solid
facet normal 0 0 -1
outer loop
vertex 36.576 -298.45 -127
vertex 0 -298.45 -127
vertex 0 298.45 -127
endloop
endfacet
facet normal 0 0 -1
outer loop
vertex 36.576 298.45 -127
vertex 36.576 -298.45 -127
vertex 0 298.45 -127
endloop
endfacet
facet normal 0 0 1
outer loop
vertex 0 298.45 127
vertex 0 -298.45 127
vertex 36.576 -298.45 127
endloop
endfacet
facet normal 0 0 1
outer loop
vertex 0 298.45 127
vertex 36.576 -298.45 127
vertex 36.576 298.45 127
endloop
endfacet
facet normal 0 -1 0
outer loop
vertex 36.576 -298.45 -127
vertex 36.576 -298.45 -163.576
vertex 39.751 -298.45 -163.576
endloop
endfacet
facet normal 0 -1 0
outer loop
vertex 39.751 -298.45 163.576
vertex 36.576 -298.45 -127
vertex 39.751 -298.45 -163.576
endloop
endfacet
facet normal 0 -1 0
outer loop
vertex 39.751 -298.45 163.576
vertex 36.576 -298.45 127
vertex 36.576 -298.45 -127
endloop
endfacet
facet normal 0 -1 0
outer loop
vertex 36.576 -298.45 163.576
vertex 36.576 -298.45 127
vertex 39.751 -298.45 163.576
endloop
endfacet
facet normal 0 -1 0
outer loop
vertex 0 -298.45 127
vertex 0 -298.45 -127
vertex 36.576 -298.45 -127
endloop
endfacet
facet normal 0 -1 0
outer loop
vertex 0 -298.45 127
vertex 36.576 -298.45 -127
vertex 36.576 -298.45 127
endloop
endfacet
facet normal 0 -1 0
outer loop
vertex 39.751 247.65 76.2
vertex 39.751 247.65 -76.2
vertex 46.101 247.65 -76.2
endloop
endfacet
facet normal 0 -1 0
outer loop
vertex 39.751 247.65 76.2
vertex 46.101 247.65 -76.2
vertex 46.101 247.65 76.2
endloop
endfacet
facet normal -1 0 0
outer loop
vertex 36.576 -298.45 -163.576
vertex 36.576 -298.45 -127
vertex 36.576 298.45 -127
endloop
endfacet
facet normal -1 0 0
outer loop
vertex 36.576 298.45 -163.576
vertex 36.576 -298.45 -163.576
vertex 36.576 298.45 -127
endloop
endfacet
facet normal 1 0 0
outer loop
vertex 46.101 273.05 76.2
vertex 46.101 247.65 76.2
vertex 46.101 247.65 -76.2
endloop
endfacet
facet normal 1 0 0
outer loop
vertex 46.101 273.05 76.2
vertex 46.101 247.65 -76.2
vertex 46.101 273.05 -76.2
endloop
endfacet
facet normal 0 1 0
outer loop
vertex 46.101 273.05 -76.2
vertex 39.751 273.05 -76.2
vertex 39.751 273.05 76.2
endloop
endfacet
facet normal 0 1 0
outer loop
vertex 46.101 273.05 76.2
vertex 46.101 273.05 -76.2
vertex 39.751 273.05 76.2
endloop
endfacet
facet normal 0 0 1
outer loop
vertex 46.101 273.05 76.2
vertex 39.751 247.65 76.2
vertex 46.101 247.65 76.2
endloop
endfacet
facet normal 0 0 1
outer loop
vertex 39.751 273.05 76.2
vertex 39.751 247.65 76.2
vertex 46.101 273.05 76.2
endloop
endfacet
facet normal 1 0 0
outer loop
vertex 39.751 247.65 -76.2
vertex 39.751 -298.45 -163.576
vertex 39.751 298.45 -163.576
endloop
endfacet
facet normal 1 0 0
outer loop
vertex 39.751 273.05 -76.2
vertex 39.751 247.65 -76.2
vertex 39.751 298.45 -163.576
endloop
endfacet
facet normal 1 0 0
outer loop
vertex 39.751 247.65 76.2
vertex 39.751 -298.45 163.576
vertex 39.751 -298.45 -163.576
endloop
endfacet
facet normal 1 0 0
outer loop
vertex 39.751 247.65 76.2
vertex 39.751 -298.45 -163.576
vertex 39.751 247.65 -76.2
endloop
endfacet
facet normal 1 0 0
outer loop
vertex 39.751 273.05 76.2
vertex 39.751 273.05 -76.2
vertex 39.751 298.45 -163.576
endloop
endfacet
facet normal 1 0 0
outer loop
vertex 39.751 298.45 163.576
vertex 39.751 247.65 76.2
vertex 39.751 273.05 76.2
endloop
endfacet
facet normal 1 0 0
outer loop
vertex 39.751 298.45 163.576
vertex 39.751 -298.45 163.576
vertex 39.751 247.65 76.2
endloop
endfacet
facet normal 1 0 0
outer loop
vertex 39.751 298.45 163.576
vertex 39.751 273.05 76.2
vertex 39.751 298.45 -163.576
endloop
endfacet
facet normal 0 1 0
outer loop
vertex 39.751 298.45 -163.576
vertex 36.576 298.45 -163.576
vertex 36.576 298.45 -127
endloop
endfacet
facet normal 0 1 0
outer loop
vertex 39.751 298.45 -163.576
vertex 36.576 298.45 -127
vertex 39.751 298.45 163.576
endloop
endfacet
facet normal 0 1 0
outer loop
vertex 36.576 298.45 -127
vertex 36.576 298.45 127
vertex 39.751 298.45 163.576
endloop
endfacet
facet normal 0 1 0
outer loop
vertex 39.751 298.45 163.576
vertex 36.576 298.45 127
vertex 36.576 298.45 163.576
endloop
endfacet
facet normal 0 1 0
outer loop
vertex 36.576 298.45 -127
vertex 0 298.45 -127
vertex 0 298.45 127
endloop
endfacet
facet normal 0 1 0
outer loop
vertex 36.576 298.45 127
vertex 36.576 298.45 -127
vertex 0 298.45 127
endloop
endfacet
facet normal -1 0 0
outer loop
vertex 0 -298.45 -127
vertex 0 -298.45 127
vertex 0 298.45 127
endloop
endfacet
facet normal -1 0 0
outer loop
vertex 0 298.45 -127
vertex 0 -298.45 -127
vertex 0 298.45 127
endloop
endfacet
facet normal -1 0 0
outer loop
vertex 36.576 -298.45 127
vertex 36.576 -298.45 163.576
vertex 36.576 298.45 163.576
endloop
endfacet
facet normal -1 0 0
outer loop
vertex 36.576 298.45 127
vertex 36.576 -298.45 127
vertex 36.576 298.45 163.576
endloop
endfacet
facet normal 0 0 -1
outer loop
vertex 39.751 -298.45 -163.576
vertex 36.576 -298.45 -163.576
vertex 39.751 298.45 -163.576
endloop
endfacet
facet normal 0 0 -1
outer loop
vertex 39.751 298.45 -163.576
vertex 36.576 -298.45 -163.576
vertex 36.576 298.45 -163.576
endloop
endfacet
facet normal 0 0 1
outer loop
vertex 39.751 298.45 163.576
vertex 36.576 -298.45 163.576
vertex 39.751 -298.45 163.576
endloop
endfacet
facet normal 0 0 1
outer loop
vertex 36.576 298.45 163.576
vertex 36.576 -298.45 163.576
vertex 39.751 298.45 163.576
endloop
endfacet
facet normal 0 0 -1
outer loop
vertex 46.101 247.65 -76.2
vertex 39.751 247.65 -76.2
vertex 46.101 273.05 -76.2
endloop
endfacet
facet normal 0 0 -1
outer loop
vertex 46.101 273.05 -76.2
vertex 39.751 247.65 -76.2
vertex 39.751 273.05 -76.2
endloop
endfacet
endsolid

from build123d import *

# Parameters (mm, degrees)
F0_W     = 596.9
F0_H     = 254
F1_DEPTH = 36.576
F2_W     = 596.9
F2_H     = 327.152
F3_DEPTH = 3.175
F4_W     = 25.4
F4_H     = 152.4
F5_DEPTH = 6.35


with BuildPart() as f1:
    # F0 (on Right) → F1 (new body)
    with BuildSketch(Plane.YZ):
        Rectangle(F0_W, F0_H)
    extrude(amount=F1_DEPTH)

    # F2 (on face) → F3 (join)
    with BuildSketch(Plane.YZ.offset(36.576)):
        Rectangle(F2_W, F2_H)
    extrude(amount=F3_DEPTH)

    # F4 (on face) → F5 (join)
    with BuildSketch(Plane.YZ.offset(39.751)):
        with Locations((260.35, 0)):
            Rectangle(F4_W, F4_H)
    extrude(amount=F5_DEPTH)


solid = f1.part
